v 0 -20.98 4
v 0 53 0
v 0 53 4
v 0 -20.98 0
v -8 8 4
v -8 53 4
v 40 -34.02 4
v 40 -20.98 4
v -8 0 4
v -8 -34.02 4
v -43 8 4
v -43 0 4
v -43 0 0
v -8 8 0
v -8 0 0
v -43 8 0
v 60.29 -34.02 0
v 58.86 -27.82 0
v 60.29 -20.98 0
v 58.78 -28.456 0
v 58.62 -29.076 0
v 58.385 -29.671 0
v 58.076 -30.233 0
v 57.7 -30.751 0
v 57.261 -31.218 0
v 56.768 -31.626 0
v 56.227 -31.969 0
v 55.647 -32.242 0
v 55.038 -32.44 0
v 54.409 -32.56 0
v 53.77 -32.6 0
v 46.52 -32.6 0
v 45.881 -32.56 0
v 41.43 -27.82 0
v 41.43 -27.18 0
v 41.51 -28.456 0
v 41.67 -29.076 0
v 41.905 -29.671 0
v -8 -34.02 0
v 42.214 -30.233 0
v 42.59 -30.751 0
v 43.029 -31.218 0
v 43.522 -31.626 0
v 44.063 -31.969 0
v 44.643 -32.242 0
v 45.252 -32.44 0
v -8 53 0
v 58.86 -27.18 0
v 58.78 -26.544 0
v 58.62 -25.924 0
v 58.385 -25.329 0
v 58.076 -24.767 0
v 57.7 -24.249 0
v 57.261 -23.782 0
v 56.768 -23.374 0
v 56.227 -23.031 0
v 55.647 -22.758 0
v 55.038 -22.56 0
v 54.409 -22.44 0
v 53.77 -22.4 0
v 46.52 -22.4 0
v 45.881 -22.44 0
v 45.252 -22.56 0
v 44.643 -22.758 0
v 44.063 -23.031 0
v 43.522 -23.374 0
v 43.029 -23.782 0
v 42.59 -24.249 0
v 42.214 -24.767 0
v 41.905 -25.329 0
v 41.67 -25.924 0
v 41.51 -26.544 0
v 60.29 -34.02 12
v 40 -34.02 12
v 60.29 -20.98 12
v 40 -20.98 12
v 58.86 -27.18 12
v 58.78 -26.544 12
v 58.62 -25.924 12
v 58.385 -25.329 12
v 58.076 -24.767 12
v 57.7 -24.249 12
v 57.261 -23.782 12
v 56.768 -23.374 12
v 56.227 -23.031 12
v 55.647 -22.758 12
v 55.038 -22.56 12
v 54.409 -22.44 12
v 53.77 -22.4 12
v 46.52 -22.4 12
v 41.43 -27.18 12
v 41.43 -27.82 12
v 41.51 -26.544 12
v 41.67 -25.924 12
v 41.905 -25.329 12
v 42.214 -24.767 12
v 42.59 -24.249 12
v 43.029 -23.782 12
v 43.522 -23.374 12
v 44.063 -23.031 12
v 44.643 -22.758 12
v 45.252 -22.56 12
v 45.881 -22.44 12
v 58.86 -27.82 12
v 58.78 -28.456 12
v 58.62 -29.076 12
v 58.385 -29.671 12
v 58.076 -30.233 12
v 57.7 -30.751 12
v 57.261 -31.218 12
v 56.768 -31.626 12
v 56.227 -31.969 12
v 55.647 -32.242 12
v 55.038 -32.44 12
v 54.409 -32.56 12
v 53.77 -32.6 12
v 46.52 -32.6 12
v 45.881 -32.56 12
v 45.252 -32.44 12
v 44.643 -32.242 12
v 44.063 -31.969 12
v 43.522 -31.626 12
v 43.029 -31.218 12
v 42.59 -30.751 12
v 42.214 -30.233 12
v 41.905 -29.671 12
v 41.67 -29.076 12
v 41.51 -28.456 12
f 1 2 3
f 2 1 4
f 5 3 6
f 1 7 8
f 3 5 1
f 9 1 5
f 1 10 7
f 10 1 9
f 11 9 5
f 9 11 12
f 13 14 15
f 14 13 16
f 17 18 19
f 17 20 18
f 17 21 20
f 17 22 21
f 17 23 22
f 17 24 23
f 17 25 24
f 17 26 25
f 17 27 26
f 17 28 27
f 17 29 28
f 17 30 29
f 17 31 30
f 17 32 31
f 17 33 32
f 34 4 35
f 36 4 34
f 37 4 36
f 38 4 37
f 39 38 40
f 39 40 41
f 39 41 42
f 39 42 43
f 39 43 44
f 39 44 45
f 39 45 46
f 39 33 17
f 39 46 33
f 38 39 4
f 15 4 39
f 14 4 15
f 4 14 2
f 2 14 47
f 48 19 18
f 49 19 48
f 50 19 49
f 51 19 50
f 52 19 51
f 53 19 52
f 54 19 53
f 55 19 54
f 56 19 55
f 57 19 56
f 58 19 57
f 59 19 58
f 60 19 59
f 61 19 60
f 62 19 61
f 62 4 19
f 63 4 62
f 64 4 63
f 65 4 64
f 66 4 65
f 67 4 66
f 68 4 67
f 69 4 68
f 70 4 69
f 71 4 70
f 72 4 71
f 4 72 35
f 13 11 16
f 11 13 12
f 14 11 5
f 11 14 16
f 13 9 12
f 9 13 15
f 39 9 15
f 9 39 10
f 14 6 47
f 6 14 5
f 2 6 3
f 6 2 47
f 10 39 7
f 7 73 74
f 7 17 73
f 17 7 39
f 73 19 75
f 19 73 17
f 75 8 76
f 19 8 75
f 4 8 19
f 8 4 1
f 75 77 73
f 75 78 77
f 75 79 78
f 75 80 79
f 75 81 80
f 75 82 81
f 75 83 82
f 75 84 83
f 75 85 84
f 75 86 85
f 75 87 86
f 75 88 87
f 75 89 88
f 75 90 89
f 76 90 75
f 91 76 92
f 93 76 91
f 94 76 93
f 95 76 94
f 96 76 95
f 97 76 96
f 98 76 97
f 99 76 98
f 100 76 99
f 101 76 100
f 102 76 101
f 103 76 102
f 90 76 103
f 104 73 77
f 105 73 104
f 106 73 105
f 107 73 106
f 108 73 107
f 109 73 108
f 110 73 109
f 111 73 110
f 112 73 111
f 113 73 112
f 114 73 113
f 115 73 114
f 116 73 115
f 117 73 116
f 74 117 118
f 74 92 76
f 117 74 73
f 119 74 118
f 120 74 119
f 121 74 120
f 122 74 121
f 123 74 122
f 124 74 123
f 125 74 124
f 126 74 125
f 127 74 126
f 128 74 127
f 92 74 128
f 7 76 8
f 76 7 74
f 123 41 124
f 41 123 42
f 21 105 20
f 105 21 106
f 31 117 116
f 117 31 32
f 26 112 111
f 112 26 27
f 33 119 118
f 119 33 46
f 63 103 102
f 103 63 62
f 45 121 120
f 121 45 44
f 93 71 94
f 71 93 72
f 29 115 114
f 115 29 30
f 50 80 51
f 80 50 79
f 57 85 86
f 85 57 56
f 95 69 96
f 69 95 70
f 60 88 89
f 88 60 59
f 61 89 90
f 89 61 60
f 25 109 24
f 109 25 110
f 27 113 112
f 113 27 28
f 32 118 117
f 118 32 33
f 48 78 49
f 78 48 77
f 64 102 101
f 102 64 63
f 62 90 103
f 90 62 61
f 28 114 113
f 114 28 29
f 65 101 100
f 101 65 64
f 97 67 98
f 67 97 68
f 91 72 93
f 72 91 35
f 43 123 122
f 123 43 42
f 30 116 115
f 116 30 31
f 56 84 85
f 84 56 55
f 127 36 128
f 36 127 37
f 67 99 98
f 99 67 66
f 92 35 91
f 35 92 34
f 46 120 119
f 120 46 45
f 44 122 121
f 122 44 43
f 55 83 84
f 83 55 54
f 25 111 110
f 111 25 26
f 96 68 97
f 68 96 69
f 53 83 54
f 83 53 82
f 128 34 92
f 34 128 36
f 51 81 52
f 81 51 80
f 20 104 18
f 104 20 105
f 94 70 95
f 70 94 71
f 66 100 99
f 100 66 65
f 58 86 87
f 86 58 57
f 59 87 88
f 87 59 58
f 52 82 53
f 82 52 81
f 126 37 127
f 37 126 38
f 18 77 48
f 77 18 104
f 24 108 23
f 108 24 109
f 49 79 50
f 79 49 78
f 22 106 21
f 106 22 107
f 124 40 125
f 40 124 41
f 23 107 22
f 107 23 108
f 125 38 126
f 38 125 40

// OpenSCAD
/* [General] */
layout = "all";
extrusion_width = .38;
wall_width = extrusion_width * 4;
base_height = 4;

/* [Mounting Hole] */
mount_hole_major_axis = 17.25;
mount_hole_minor_axis = 10;
// Measured off the bottom of the mount (includive of base_height).
mount_block_height = 12;
clearance = 0.1;
// Offset off front wall of gantry clamp to place the iSight edge.
y_offset = 10;
// Offset off side wall of gantry clamp to place mounting block.
x_offset = 40;

/* [Hidden] */
isight_radius = 35/2;
r = mount_hole_minor_axis/2;
$fn = 50;

module isight_mount(h = 5, c = clearance) {

  linear_extrude(height = h, center = true)
  difference() {
    hull() {
      translate([0, r]) circle(r + c + wall_width);
      translate([0, mount_hole_major_axis - r]) circle(r + c + wall_width);
    }
    hull() {
      translate([0, r]) circle(r + c);
      translate([0, mount_hole_major_axis - r]) circle(r + c);
    }
  }
}

module mount_test() {
  for (i = [0 : 3]) {
    translate([i * 15, 0]) mount(c = .1 * i);
  }
}

module hole(h, c = clearance) {
  linear_extrude(height = h, center = true)
  hull() {
    translate([0, r]) circle(r + c);
    translate([0, mount_hole_major_axis - r]) circle(r + c);
  }
}

module all() {
  difference() {
    union() {
      translate([-43, 0, 0])
      cube([43, 8, base_height]);

      translate([-8, -(y_offset + isight_radius + r + wall_width), 0])
      cube([8, y_offset + isight_radius + r + wall_width + 53, base_height]);

      translate([-8, -(y_offset + isight_radius + r + wall_width), 0])
      cube([8 + x_offset + mount_hole_major_axis + 2*wall_width, mount_hole_minor_axis + 2*wall_width, base_height]);

      translate([x_offset, -(y_offset + isight_radius + r + wall_width), 0])
      cube([mount_hole_major_axis + 2*wall_width, mount_hole_minor_axis + 2*wall_width, mount_block_height]);
    }

    translate([x_offset + wall_width, -y_offset - isight_radius, mount_block_height])
    rotate([0, 0, -90]) hole(h = 60);
  }
}

if (layout == "isight_mount_test") mount_test();
else all();
